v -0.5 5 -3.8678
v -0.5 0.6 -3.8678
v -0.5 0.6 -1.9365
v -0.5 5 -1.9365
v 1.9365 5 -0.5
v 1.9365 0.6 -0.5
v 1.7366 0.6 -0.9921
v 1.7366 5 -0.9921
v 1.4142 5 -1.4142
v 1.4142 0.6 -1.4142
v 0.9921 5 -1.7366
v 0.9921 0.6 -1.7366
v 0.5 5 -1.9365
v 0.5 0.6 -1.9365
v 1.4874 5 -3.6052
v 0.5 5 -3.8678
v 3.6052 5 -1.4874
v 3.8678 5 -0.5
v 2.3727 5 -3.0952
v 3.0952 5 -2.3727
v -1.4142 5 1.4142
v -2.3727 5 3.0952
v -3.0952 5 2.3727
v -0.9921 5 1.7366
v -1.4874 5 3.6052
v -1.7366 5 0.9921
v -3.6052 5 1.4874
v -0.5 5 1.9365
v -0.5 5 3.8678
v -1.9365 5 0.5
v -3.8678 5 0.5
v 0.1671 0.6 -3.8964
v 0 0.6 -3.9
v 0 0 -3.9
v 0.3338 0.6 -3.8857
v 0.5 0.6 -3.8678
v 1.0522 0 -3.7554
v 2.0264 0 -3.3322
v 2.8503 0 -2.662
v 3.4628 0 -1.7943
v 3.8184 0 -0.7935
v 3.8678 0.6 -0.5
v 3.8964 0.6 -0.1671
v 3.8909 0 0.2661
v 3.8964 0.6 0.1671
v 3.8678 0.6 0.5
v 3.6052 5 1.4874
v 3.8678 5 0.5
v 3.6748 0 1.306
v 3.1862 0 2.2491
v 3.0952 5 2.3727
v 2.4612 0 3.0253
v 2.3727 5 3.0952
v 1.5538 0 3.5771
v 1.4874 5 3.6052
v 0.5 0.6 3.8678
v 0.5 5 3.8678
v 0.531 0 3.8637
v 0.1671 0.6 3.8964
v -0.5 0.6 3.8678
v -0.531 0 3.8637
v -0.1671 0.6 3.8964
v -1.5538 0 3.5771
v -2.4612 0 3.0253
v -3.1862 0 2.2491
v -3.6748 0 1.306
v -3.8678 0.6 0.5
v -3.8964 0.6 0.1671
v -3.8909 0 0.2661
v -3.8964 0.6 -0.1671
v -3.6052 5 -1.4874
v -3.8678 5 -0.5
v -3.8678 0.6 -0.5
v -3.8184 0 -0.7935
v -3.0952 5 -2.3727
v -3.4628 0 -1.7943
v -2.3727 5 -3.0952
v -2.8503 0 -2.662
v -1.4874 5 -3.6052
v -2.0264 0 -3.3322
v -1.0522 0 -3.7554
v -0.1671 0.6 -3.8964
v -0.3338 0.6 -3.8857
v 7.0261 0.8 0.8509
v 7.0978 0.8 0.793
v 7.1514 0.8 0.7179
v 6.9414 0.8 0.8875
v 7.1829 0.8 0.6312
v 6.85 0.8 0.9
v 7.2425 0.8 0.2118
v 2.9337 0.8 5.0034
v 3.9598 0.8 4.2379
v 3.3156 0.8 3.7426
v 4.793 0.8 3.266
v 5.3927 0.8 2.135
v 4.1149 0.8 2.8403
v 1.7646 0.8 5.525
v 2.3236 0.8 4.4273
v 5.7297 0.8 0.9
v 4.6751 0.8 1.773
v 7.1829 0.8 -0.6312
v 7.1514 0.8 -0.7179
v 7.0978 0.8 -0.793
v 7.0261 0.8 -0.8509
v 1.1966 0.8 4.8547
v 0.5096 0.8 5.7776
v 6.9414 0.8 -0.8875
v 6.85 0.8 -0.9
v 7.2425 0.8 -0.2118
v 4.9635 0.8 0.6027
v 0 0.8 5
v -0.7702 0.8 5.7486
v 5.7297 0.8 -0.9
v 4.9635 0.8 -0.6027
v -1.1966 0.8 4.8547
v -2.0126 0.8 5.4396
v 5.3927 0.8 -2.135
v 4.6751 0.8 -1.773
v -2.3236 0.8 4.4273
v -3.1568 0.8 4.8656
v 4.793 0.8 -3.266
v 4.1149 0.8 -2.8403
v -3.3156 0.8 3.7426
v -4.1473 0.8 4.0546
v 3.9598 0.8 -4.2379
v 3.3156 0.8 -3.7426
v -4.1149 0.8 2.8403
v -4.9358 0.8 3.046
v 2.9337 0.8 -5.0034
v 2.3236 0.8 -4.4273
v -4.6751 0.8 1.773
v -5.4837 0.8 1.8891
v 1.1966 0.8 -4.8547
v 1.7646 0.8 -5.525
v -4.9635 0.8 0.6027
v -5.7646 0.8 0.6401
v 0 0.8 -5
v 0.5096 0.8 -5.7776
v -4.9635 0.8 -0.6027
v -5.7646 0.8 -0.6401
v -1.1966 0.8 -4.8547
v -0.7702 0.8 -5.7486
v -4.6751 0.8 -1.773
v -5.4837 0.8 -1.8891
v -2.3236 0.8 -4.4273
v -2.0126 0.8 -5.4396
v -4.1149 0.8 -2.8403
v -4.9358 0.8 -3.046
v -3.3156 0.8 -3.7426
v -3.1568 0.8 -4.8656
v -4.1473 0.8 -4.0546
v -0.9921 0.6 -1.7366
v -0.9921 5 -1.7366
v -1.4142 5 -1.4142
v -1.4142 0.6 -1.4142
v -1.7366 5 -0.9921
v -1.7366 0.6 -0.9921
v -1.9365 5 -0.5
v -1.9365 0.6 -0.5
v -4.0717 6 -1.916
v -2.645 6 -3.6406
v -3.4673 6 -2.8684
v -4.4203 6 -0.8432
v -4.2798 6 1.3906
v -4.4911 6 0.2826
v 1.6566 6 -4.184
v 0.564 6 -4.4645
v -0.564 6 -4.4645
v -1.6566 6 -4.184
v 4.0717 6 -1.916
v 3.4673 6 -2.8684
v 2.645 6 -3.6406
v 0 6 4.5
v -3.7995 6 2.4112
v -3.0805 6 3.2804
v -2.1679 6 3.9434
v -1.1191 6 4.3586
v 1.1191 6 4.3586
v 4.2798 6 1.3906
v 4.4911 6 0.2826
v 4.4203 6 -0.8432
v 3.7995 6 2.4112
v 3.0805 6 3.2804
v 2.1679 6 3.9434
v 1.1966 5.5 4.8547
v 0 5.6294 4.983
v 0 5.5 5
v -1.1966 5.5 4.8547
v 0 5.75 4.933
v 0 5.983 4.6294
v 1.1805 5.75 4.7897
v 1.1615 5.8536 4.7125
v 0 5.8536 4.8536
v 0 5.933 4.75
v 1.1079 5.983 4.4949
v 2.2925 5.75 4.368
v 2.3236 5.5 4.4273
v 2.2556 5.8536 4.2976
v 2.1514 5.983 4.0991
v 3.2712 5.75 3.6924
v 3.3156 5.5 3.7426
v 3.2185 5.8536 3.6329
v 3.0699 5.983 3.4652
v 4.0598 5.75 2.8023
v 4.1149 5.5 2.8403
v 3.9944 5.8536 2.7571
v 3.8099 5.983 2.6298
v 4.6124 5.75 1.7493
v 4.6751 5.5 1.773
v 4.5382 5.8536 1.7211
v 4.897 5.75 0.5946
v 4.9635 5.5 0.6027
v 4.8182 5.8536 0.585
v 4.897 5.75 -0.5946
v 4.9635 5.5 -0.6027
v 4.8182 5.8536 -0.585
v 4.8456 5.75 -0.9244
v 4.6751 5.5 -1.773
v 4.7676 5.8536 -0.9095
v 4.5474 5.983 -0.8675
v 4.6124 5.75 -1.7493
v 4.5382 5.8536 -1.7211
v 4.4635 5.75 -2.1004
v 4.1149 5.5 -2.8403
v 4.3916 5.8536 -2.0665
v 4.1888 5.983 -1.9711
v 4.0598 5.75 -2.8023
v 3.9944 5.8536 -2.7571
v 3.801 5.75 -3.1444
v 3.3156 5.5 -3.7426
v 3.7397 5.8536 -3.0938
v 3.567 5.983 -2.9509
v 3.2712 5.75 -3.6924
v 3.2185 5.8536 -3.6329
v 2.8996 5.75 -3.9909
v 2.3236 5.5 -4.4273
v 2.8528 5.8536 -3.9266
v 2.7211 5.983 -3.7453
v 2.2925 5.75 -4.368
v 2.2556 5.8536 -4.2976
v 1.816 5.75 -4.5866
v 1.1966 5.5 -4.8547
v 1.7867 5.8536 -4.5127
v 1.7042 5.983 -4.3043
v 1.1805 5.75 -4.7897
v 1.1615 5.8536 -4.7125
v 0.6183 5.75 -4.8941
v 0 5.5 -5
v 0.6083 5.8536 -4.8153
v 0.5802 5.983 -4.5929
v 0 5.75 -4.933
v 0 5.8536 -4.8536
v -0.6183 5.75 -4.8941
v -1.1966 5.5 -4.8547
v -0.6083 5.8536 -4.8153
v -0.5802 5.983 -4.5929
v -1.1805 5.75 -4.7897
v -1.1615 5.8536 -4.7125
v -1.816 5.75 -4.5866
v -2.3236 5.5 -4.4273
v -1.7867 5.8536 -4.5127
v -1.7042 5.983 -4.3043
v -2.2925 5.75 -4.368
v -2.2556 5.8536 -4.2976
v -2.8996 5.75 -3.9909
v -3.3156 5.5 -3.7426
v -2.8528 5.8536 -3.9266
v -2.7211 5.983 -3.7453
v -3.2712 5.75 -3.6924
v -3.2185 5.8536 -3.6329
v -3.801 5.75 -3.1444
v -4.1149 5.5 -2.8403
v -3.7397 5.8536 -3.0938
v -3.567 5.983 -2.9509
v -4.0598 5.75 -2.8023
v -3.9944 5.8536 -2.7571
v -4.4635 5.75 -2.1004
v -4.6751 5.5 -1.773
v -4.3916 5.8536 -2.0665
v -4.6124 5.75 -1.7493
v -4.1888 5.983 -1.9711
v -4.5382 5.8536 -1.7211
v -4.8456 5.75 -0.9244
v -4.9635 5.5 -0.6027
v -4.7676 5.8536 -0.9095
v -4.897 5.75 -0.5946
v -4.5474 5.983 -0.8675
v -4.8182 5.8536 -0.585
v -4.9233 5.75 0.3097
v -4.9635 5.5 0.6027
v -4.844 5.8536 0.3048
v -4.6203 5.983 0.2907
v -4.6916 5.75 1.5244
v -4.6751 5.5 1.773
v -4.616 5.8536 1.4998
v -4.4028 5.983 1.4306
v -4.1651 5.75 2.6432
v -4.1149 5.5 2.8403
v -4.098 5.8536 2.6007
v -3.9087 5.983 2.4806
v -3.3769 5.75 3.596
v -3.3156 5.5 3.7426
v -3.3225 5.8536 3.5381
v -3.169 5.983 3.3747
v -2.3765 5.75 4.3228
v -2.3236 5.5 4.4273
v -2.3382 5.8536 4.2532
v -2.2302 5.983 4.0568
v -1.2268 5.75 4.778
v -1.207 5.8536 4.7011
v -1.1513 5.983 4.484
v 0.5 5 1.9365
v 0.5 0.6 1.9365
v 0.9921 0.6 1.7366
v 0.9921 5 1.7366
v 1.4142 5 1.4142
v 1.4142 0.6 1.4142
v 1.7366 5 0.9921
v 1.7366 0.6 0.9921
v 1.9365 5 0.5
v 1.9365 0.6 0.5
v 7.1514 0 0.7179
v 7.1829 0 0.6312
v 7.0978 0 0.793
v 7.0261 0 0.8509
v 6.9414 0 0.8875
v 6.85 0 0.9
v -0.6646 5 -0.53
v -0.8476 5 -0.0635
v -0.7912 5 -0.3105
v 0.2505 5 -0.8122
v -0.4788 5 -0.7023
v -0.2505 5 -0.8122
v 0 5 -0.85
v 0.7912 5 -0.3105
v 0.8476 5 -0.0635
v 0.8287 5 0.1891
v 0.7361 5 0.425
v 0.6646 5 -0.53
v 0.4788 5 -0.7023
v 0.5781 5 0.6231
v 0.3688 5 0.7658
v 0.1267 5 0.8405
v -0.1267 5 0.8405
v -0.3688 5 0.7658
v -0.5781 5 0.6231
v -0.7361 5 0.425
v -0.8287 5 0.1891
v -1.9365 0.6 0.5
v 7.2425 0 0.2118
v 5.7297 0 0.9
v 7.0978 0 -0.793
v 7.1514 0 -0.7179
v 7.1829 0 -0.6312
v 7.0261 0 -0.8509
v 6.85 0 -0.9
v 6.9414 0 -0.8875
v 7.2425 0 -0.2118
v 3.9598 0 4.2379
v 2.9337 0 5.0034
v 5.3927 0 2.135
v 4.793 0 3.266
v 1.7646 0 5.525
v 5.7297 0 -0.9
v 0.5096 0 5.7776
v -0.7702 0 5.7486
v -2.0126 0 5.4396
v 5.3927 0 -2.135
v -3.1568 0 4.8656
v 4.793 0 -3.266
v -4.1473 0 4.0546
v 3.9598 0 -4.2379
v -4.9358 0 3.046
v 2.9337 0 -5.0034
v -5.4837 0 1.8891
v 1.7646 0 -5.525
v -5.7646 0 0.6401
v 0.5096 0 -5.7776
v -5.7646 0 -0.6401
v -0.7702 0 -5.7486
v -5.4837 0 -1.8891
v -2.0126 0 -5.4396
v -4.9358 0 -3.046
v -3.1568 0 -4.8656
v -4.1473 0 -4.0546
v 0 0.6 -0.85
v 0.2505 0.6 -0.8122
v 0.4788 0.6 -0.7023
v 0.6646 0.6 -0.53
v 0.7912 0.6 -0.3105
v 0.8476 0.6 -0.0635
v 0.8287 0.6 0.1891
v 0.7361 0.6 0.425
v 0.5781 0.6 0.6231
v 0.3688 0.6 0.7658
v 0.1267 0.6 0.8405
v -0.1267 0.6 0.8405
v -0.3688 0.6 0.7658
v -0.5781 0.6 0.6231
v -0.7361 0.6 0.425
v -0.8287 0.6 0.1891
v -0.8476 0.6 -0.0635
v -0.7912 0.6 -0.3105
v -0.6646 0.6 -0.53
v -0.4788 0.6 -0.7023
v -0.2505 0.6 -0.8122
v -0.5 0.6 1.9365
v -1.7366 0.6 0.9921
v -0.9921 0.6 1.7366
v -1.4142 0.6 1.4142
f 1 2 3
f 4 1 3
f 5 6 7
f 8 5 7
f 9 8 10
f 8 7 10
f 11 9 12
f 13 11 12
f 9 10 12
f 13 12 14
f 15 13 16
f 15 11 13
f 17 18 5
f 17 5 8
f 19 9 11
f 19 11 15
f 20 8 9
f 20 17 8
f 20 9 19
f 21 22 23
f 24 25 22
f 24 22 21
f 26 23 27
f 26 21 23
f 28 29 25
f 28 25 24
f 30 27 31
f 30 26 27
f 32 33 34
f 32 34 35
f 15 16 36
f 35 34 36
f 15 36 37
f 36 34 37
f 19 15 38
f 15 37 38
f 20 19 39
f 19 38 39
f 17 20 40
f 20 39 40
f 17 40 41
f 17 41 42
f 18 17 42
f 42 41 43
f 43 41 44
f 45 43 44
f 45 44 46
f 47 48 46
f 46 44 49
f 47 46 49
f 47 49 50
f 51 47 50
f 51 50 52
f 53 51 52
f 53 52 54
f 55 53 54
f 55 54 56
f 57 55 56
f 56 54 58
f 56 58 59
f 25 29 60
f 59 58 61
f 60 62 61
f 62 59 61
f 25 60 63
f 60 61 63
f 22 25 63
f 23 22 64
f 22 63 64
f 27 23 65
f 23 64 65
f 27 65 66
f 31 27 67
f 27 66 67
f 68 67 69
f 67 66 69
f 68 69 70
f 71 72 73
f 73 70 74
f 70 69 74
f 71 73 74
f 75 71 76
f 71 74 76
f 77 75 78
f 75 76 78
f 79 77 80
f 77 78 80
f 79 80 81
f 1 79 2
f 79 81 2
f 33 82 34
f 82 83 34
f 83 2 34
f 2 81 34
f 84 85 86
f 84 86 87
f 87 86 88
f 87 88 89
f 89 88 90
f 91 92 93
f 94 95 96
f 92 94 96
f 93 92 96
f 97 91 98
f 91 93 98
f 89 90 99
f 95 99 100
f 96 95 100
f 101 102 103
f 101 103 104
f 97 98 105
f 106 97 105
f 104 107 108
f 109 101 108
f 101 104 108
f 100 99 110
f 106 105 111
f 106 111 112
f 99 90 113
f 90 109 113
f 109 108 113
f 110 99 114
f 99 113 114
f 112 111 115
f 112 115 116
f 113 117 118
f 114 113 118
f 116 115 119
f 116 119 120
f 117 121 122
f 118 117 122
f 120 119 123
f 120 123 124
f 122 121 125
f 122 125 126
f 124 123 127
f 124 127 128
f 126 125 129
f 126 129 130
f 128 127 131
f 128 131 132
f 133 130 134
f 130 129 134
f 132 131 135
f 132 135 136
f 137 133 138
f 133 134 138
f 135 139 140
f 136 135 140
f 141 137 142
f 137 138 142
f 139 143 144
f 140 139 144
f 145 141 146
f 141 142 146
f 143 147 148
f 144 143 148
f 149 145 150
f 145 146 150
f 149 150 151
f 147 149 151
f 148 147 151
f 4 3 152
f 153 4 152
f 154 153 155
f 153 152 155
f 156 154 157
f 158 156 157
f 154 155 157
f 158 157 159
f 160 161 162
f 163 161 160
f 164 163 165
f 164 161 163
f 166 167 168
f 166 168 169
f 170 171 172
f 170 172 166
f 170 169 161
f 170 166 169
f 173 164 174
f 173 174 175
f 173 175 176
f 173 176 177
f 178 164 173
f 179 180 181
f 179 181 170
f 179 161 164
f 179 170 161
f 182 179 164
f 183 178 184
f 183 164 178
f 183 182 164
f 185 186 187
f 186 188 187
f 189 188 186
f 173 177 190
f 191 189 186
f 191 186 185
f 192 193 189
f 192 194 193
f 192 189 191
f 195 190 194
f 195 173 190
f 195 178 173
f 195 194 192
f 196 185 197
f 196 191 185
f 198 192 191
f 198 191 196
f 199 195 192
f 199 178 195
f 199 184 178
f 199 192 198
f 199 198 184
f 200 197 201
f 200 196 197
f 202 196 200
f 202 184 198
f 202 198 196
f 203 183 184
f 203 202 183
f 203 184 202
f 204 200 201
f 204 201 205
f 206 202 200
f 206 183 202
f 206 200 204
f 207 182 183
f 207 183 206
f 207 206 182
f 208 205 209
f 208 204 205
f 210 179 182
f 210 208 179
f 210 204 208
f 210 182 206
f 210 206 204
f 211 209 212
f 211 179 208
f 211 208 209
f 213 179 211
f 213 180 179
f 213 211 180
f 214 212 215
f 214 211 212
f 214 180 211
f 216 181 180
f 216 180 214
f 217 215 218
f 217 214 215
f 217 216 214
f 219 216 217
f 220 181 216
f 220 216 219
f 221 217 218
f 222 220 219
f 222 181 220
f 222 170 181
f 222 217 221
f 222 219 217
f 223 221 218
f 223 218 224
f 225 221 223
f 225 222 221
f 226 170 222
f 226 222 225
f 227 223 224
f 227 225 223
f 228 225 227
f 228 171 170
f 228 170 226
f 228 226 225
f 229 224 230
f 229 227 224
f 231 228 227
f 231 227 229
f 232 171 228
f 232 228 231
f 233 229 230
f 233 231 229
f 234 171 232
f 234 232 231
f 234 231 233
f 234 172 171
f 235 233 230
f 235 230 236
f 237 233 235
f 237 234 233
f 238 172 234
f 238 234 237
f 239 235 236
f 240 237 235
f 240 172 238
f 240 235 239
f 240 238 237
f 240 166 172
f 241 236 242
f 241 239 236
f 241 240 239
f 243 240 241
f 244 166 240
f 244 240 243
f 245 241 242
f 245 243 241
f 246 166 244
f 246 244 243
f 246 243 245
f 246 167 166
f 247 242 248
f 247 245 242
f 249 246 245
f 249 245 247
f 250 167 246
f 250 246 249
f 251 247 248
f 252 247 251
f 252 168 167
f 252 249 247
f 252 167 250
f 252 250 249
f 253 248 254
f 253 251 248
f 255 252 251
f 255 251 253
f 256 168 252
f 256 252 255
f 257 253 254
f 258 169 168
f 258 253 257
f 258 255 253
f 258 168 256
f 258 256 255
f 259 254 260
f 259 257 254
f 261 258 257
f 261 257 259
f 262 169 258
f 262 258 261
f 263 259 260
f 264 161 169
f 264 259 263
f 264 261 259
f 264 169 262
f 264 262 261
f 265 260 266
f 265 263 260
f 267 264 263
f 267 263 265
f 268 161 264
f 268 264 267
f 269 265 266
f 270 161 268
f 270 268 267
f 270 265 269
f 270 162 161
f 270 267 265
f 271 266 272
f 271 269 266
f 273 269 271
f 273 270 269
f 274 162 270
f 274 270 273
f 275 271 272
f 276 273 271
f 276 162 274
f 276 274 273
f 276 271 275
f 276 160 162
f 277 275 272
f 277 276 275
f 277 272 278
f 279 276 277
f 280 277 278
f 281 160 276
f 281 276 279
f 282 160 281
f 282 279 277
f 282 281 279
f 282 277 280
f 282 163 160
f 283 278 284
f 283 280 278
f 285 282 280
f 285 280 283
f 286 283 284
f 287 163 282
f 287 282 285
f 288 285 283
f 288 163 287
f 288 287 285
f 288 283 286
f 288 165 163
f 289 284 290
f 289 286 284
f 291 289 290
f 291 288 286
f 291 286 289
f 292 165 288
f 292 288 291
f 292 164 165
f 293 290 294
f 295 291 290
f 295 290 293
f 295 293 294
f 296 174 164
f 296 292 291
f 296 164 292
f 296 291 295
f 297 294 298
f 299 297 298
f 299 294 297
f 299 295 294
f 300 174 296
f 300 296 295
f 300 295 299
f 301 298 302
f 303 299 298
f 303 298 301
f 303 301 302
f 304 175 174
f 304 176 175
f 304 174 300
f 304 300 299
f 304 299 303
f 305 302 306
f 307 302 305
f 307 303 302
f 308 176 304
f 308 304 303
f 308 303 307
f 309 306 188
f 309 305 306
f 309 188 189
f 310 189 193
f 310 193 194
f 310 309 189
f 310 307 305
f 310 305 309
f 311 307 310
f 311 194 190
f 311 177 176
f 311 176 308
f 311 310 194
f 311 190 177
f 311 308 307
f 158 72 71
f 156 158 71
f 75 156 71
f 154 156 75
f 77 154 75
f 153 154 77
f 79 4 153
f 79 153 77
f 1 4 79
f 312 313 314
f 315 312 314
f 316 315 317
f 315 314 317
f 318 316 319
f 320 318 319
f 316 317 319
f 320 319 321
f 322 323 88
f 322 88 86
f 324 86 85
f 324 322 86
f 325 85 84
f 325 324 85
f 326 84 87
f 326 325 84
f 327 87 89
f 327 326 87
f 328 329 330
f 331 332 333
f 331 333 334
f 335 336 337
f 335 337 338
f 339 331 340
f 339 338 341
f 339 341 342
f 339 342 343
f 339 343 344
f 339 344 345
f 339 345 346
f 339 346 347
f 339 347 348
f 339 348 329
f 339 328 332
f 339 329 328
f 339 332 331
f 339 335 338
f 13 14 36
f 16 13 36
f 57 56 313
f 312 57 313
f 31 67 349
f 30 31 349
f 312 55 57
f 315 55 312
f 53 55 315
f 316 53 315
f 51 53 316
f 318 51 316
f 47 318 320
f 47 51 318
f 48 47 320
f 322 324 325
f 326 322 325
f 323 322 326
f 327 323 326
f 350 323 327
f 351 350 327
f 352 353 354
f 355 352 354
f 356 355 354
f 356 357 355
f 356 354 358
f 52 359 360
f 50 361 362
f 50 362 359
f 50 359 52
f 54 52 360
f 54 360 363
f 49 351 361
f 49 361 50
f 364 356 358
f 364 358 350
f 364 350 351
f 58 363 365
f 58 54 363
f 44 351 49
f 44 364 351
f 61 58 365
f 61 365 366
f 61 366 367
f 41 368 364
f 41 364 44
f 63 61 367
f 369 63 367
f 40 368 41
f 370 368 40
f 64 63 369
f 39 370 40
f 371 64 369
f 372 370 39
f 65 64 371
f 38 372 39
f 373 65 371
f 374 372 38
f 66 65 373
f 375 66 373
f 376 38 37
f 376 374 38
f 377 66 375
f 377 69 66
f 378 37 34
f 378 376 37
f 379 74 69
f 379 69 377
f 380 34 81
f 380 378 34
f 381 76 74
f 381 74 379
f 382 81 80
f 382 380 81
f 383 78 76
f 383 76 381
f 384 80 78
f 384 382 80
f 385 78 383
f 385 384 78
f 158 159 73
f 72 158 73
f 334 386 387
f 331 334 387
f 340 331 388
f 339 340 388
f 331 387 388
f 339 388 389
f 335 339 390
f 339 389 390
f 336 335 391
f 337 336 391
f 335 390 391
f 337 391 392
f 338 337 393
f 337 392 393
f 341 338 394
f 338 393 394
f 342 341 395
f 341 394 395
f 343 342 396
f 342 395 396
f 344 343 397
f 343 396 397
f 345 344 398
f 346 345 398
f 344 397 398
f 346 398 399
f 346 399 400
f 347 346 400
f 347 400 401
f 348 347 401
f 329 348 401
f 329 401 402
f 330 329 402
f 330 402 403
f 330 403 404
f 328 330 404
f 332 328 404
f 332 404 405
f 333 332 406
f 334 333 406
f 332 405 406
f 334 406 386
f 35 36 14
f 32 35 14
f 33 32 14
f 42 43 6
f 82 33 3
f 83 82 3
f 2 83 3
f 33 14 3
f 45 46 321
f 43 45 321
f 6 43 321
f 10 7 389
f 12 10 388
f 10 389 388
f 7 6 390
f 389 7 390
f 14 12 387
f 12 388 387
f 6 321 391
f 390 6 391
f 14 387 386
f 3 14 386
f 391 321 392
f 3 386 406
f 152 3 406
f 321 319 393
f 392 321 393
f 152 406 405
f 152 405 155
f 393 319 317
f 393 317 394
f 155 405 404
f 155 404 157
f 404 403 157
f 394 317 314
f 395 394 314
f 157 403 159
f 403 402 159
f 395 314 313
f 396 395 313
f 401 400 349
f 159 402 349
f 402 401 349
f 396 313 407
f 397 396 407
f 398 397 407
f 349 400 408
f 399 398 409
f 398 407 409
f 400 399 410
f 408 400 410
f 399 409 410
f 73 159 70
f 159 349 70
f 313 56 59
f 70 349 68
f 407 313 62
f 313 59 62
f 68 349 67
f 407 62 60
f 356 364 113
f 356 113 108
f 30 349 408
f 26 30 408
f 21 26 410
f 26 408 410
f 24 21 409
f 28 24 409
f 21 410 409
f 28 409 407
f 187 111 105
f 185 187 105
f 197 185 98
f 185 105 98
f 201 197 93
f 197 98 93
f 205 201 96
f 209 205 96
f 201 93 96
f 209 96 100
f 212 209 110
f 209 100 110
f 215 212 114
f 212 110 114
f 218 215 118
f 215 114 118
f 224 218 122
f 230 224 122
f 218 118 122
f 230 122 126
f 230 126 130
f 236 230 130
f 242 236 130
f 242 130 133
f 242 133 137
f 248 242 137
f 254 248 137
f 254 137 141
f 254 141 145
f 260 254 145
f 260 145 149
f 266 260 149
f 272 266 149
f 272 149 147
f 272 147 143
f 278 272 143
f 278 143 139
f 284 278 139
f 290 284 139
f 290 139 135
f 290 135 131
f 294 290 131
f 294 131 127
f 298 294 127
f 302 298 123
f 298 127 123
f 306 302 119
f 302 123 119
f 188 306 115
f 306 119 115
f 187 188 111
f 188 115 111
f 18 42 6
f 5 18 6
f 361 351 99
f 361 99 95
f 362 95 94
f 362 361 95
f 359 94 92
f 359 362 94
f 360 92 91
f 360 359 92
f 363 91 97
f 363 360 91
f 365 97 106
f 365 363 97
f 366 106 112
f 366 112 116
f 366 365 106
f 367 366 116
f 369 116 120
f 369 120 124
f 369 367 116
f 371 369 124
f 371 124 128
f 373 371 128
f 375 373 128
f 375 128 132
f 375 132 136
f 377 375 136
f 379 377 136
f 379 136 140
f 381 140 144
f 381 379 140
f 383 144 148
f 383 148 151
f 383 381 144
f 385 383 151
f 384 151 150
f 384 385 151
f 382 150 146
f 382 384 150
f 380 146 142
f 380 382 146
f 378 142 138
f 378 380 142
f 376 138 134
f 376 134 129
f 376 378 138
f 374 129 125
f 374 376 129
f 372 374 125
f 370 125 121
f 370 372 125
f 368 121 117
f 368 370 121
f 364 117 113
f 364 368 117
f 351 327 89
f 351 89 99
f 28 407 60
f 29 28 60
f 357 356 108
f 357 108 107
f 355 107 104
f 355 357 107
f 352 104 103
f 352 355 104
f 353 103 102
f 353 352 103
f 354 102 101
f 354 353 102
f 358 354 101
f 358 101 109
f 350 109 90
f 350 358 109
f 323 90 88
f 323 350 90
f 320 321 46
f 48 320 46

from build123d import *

# Parameters (mm, degrees)
ESQUISSE1_R             = 5
SUPPORT_DEPTH           = 0.8
ESQUISSE2_R             = 5
BOUTON_DEPTH            = 6
CONG_1_R                = 0.5
ESQUISSE3_R             = 3.9
ENL_V_MAT_EXTRU_1_DEPTH = 5
DESSOUS_START           = 4.4
ESQUISSE4_R             = 0.85
DESSOUS_DEPTH           = 4.4


with BuildPart() as part:
    # Esquisse1 → Support (new body)
    with BuildSketch(Plane(origin=(0, 0, 0), x_dir=(1, 0, 0), z_dir=(0, 1, 0))):
        with BuildLine():
            Line((5.72974694, 0.9), (6.85, 0.9))
            ThreePointArc((6.85, 0.9), (7.063933825, 0.824394259), (7.182855864, 0.631154879))
            ThreePointArc((7.182855864, 0.631154879), (7.25, 0), (7.182855864, -0.631154879))
            ThreePointArc((7.182855864, -0.631154879), (7.063933825, -0.824394259), (6.85, -0.9))
            Line((6.85, -0.9), (5.72974694, -0.9))
            ThreePointArc((5.72974694, -0.9), (-5.8, 0), (5.72974694, 0.9))
        make_face()
        with Locations(Location((0, 0, 0), (0, 0, 270))):
            Circle(ESQUISSE1_R, mode=Mode.SUBTRACT)
    extrude(amount=SUPPORT_DEPTH)

    # Esquisse2 → Bouton (add)
    with BuildSketch(Plane(origin=(0, 0, 0), x_dir=(1, 0, 0), z_dir=(0, 1, 0))):
        with Locations(Location((0, 0, 0), (0, 0, 270))):
            Circle(ESQUISSE2_R)
    extrude(amount=BOUTON_DEPTH)

    # Congé1
    cong_1_edges = [part.edges().sort_by_distance(p)[0] for p in [
        (0, 6, -5),
    ]]
    fillet(cong_1_edges, radius=CONG_1_R)

    # Esquisse3 → Enlèv. mat.-Extru.1 (cut)
    with BuildSketch(Plane.XZ):
        with Locations(Location((0, 0, 0), (0, 0, 270))):
            Circle(ESQUISSE3_R)
    extrude(amount=-ENL_V_MAT_EXTRU_1_DEPTH, mode=Mode.SUBTRACT)

    # Esquisse4 → Dessous (add)
    with BuildSketch(Plane.XZ.offset(-5).offset(DESSOUS_START)):
        with BuildLine():
            Line((-0.5, 1.936491673), (-0.5, 3.867815921))
            ThreePointArc((-0.5, 3.867815921), (0, 3.9), (0.5, 3.867815921))
            Line((0.5, 3.867815921), (0.5, 1.936491673))
            ThreePointArc((0.5, 1.936491673), (1.414213562, 1.414213562), (1.936491673, 0.5))
            Line((1.936491673, 0.5), (3.867815921, 0.5))
            ThreePointArc((3.867815921, 0.5), (3.9, 0), (3.867815921, -0.5))
            Line((3.867815921, -0.5), (1.936491673, -0.5))
            ThreePointArc((1.936491673, -0.5), (1.414213562, -1.414213562), (0.5, -1.936491673))
            Line((0.5, -1.936491673), (0.5, -3.867815921))
            ThreePointArc((0.5, -3.867815921), (0, -3.9), (-0.5, -3.867815921))
            Line((-0.5, -3.867815921), (-0.5, -1.936491673))
            ThreePointArc((-0.5, -1.936491673), (-1.414213562, -1.414213562), (-1.936491673, -0.5))
            Line((-1.936491673, -0.5), (-3.867815921, -0.5))
            ThreePointArc((-3.867815921, -0.5), (-3.9, 0), (-3.867815921, 0.5))
            Line((-3.867815921, 0.5), (-1.936491673, 0.5))
            ThreePointArc((-1.936491673, 0.5), (-1.414213562, 1.414213562), (-0.5, 1.936491673))
        make_face()
        with Locations(Location((0, 0, 0), (0, 0, 270))):
            Circle(ESQUISSE4_R, mode=Mode.SUBTRACT)
    extrude(amount=-DESSOUS_DEPTH)


solid = part.part
